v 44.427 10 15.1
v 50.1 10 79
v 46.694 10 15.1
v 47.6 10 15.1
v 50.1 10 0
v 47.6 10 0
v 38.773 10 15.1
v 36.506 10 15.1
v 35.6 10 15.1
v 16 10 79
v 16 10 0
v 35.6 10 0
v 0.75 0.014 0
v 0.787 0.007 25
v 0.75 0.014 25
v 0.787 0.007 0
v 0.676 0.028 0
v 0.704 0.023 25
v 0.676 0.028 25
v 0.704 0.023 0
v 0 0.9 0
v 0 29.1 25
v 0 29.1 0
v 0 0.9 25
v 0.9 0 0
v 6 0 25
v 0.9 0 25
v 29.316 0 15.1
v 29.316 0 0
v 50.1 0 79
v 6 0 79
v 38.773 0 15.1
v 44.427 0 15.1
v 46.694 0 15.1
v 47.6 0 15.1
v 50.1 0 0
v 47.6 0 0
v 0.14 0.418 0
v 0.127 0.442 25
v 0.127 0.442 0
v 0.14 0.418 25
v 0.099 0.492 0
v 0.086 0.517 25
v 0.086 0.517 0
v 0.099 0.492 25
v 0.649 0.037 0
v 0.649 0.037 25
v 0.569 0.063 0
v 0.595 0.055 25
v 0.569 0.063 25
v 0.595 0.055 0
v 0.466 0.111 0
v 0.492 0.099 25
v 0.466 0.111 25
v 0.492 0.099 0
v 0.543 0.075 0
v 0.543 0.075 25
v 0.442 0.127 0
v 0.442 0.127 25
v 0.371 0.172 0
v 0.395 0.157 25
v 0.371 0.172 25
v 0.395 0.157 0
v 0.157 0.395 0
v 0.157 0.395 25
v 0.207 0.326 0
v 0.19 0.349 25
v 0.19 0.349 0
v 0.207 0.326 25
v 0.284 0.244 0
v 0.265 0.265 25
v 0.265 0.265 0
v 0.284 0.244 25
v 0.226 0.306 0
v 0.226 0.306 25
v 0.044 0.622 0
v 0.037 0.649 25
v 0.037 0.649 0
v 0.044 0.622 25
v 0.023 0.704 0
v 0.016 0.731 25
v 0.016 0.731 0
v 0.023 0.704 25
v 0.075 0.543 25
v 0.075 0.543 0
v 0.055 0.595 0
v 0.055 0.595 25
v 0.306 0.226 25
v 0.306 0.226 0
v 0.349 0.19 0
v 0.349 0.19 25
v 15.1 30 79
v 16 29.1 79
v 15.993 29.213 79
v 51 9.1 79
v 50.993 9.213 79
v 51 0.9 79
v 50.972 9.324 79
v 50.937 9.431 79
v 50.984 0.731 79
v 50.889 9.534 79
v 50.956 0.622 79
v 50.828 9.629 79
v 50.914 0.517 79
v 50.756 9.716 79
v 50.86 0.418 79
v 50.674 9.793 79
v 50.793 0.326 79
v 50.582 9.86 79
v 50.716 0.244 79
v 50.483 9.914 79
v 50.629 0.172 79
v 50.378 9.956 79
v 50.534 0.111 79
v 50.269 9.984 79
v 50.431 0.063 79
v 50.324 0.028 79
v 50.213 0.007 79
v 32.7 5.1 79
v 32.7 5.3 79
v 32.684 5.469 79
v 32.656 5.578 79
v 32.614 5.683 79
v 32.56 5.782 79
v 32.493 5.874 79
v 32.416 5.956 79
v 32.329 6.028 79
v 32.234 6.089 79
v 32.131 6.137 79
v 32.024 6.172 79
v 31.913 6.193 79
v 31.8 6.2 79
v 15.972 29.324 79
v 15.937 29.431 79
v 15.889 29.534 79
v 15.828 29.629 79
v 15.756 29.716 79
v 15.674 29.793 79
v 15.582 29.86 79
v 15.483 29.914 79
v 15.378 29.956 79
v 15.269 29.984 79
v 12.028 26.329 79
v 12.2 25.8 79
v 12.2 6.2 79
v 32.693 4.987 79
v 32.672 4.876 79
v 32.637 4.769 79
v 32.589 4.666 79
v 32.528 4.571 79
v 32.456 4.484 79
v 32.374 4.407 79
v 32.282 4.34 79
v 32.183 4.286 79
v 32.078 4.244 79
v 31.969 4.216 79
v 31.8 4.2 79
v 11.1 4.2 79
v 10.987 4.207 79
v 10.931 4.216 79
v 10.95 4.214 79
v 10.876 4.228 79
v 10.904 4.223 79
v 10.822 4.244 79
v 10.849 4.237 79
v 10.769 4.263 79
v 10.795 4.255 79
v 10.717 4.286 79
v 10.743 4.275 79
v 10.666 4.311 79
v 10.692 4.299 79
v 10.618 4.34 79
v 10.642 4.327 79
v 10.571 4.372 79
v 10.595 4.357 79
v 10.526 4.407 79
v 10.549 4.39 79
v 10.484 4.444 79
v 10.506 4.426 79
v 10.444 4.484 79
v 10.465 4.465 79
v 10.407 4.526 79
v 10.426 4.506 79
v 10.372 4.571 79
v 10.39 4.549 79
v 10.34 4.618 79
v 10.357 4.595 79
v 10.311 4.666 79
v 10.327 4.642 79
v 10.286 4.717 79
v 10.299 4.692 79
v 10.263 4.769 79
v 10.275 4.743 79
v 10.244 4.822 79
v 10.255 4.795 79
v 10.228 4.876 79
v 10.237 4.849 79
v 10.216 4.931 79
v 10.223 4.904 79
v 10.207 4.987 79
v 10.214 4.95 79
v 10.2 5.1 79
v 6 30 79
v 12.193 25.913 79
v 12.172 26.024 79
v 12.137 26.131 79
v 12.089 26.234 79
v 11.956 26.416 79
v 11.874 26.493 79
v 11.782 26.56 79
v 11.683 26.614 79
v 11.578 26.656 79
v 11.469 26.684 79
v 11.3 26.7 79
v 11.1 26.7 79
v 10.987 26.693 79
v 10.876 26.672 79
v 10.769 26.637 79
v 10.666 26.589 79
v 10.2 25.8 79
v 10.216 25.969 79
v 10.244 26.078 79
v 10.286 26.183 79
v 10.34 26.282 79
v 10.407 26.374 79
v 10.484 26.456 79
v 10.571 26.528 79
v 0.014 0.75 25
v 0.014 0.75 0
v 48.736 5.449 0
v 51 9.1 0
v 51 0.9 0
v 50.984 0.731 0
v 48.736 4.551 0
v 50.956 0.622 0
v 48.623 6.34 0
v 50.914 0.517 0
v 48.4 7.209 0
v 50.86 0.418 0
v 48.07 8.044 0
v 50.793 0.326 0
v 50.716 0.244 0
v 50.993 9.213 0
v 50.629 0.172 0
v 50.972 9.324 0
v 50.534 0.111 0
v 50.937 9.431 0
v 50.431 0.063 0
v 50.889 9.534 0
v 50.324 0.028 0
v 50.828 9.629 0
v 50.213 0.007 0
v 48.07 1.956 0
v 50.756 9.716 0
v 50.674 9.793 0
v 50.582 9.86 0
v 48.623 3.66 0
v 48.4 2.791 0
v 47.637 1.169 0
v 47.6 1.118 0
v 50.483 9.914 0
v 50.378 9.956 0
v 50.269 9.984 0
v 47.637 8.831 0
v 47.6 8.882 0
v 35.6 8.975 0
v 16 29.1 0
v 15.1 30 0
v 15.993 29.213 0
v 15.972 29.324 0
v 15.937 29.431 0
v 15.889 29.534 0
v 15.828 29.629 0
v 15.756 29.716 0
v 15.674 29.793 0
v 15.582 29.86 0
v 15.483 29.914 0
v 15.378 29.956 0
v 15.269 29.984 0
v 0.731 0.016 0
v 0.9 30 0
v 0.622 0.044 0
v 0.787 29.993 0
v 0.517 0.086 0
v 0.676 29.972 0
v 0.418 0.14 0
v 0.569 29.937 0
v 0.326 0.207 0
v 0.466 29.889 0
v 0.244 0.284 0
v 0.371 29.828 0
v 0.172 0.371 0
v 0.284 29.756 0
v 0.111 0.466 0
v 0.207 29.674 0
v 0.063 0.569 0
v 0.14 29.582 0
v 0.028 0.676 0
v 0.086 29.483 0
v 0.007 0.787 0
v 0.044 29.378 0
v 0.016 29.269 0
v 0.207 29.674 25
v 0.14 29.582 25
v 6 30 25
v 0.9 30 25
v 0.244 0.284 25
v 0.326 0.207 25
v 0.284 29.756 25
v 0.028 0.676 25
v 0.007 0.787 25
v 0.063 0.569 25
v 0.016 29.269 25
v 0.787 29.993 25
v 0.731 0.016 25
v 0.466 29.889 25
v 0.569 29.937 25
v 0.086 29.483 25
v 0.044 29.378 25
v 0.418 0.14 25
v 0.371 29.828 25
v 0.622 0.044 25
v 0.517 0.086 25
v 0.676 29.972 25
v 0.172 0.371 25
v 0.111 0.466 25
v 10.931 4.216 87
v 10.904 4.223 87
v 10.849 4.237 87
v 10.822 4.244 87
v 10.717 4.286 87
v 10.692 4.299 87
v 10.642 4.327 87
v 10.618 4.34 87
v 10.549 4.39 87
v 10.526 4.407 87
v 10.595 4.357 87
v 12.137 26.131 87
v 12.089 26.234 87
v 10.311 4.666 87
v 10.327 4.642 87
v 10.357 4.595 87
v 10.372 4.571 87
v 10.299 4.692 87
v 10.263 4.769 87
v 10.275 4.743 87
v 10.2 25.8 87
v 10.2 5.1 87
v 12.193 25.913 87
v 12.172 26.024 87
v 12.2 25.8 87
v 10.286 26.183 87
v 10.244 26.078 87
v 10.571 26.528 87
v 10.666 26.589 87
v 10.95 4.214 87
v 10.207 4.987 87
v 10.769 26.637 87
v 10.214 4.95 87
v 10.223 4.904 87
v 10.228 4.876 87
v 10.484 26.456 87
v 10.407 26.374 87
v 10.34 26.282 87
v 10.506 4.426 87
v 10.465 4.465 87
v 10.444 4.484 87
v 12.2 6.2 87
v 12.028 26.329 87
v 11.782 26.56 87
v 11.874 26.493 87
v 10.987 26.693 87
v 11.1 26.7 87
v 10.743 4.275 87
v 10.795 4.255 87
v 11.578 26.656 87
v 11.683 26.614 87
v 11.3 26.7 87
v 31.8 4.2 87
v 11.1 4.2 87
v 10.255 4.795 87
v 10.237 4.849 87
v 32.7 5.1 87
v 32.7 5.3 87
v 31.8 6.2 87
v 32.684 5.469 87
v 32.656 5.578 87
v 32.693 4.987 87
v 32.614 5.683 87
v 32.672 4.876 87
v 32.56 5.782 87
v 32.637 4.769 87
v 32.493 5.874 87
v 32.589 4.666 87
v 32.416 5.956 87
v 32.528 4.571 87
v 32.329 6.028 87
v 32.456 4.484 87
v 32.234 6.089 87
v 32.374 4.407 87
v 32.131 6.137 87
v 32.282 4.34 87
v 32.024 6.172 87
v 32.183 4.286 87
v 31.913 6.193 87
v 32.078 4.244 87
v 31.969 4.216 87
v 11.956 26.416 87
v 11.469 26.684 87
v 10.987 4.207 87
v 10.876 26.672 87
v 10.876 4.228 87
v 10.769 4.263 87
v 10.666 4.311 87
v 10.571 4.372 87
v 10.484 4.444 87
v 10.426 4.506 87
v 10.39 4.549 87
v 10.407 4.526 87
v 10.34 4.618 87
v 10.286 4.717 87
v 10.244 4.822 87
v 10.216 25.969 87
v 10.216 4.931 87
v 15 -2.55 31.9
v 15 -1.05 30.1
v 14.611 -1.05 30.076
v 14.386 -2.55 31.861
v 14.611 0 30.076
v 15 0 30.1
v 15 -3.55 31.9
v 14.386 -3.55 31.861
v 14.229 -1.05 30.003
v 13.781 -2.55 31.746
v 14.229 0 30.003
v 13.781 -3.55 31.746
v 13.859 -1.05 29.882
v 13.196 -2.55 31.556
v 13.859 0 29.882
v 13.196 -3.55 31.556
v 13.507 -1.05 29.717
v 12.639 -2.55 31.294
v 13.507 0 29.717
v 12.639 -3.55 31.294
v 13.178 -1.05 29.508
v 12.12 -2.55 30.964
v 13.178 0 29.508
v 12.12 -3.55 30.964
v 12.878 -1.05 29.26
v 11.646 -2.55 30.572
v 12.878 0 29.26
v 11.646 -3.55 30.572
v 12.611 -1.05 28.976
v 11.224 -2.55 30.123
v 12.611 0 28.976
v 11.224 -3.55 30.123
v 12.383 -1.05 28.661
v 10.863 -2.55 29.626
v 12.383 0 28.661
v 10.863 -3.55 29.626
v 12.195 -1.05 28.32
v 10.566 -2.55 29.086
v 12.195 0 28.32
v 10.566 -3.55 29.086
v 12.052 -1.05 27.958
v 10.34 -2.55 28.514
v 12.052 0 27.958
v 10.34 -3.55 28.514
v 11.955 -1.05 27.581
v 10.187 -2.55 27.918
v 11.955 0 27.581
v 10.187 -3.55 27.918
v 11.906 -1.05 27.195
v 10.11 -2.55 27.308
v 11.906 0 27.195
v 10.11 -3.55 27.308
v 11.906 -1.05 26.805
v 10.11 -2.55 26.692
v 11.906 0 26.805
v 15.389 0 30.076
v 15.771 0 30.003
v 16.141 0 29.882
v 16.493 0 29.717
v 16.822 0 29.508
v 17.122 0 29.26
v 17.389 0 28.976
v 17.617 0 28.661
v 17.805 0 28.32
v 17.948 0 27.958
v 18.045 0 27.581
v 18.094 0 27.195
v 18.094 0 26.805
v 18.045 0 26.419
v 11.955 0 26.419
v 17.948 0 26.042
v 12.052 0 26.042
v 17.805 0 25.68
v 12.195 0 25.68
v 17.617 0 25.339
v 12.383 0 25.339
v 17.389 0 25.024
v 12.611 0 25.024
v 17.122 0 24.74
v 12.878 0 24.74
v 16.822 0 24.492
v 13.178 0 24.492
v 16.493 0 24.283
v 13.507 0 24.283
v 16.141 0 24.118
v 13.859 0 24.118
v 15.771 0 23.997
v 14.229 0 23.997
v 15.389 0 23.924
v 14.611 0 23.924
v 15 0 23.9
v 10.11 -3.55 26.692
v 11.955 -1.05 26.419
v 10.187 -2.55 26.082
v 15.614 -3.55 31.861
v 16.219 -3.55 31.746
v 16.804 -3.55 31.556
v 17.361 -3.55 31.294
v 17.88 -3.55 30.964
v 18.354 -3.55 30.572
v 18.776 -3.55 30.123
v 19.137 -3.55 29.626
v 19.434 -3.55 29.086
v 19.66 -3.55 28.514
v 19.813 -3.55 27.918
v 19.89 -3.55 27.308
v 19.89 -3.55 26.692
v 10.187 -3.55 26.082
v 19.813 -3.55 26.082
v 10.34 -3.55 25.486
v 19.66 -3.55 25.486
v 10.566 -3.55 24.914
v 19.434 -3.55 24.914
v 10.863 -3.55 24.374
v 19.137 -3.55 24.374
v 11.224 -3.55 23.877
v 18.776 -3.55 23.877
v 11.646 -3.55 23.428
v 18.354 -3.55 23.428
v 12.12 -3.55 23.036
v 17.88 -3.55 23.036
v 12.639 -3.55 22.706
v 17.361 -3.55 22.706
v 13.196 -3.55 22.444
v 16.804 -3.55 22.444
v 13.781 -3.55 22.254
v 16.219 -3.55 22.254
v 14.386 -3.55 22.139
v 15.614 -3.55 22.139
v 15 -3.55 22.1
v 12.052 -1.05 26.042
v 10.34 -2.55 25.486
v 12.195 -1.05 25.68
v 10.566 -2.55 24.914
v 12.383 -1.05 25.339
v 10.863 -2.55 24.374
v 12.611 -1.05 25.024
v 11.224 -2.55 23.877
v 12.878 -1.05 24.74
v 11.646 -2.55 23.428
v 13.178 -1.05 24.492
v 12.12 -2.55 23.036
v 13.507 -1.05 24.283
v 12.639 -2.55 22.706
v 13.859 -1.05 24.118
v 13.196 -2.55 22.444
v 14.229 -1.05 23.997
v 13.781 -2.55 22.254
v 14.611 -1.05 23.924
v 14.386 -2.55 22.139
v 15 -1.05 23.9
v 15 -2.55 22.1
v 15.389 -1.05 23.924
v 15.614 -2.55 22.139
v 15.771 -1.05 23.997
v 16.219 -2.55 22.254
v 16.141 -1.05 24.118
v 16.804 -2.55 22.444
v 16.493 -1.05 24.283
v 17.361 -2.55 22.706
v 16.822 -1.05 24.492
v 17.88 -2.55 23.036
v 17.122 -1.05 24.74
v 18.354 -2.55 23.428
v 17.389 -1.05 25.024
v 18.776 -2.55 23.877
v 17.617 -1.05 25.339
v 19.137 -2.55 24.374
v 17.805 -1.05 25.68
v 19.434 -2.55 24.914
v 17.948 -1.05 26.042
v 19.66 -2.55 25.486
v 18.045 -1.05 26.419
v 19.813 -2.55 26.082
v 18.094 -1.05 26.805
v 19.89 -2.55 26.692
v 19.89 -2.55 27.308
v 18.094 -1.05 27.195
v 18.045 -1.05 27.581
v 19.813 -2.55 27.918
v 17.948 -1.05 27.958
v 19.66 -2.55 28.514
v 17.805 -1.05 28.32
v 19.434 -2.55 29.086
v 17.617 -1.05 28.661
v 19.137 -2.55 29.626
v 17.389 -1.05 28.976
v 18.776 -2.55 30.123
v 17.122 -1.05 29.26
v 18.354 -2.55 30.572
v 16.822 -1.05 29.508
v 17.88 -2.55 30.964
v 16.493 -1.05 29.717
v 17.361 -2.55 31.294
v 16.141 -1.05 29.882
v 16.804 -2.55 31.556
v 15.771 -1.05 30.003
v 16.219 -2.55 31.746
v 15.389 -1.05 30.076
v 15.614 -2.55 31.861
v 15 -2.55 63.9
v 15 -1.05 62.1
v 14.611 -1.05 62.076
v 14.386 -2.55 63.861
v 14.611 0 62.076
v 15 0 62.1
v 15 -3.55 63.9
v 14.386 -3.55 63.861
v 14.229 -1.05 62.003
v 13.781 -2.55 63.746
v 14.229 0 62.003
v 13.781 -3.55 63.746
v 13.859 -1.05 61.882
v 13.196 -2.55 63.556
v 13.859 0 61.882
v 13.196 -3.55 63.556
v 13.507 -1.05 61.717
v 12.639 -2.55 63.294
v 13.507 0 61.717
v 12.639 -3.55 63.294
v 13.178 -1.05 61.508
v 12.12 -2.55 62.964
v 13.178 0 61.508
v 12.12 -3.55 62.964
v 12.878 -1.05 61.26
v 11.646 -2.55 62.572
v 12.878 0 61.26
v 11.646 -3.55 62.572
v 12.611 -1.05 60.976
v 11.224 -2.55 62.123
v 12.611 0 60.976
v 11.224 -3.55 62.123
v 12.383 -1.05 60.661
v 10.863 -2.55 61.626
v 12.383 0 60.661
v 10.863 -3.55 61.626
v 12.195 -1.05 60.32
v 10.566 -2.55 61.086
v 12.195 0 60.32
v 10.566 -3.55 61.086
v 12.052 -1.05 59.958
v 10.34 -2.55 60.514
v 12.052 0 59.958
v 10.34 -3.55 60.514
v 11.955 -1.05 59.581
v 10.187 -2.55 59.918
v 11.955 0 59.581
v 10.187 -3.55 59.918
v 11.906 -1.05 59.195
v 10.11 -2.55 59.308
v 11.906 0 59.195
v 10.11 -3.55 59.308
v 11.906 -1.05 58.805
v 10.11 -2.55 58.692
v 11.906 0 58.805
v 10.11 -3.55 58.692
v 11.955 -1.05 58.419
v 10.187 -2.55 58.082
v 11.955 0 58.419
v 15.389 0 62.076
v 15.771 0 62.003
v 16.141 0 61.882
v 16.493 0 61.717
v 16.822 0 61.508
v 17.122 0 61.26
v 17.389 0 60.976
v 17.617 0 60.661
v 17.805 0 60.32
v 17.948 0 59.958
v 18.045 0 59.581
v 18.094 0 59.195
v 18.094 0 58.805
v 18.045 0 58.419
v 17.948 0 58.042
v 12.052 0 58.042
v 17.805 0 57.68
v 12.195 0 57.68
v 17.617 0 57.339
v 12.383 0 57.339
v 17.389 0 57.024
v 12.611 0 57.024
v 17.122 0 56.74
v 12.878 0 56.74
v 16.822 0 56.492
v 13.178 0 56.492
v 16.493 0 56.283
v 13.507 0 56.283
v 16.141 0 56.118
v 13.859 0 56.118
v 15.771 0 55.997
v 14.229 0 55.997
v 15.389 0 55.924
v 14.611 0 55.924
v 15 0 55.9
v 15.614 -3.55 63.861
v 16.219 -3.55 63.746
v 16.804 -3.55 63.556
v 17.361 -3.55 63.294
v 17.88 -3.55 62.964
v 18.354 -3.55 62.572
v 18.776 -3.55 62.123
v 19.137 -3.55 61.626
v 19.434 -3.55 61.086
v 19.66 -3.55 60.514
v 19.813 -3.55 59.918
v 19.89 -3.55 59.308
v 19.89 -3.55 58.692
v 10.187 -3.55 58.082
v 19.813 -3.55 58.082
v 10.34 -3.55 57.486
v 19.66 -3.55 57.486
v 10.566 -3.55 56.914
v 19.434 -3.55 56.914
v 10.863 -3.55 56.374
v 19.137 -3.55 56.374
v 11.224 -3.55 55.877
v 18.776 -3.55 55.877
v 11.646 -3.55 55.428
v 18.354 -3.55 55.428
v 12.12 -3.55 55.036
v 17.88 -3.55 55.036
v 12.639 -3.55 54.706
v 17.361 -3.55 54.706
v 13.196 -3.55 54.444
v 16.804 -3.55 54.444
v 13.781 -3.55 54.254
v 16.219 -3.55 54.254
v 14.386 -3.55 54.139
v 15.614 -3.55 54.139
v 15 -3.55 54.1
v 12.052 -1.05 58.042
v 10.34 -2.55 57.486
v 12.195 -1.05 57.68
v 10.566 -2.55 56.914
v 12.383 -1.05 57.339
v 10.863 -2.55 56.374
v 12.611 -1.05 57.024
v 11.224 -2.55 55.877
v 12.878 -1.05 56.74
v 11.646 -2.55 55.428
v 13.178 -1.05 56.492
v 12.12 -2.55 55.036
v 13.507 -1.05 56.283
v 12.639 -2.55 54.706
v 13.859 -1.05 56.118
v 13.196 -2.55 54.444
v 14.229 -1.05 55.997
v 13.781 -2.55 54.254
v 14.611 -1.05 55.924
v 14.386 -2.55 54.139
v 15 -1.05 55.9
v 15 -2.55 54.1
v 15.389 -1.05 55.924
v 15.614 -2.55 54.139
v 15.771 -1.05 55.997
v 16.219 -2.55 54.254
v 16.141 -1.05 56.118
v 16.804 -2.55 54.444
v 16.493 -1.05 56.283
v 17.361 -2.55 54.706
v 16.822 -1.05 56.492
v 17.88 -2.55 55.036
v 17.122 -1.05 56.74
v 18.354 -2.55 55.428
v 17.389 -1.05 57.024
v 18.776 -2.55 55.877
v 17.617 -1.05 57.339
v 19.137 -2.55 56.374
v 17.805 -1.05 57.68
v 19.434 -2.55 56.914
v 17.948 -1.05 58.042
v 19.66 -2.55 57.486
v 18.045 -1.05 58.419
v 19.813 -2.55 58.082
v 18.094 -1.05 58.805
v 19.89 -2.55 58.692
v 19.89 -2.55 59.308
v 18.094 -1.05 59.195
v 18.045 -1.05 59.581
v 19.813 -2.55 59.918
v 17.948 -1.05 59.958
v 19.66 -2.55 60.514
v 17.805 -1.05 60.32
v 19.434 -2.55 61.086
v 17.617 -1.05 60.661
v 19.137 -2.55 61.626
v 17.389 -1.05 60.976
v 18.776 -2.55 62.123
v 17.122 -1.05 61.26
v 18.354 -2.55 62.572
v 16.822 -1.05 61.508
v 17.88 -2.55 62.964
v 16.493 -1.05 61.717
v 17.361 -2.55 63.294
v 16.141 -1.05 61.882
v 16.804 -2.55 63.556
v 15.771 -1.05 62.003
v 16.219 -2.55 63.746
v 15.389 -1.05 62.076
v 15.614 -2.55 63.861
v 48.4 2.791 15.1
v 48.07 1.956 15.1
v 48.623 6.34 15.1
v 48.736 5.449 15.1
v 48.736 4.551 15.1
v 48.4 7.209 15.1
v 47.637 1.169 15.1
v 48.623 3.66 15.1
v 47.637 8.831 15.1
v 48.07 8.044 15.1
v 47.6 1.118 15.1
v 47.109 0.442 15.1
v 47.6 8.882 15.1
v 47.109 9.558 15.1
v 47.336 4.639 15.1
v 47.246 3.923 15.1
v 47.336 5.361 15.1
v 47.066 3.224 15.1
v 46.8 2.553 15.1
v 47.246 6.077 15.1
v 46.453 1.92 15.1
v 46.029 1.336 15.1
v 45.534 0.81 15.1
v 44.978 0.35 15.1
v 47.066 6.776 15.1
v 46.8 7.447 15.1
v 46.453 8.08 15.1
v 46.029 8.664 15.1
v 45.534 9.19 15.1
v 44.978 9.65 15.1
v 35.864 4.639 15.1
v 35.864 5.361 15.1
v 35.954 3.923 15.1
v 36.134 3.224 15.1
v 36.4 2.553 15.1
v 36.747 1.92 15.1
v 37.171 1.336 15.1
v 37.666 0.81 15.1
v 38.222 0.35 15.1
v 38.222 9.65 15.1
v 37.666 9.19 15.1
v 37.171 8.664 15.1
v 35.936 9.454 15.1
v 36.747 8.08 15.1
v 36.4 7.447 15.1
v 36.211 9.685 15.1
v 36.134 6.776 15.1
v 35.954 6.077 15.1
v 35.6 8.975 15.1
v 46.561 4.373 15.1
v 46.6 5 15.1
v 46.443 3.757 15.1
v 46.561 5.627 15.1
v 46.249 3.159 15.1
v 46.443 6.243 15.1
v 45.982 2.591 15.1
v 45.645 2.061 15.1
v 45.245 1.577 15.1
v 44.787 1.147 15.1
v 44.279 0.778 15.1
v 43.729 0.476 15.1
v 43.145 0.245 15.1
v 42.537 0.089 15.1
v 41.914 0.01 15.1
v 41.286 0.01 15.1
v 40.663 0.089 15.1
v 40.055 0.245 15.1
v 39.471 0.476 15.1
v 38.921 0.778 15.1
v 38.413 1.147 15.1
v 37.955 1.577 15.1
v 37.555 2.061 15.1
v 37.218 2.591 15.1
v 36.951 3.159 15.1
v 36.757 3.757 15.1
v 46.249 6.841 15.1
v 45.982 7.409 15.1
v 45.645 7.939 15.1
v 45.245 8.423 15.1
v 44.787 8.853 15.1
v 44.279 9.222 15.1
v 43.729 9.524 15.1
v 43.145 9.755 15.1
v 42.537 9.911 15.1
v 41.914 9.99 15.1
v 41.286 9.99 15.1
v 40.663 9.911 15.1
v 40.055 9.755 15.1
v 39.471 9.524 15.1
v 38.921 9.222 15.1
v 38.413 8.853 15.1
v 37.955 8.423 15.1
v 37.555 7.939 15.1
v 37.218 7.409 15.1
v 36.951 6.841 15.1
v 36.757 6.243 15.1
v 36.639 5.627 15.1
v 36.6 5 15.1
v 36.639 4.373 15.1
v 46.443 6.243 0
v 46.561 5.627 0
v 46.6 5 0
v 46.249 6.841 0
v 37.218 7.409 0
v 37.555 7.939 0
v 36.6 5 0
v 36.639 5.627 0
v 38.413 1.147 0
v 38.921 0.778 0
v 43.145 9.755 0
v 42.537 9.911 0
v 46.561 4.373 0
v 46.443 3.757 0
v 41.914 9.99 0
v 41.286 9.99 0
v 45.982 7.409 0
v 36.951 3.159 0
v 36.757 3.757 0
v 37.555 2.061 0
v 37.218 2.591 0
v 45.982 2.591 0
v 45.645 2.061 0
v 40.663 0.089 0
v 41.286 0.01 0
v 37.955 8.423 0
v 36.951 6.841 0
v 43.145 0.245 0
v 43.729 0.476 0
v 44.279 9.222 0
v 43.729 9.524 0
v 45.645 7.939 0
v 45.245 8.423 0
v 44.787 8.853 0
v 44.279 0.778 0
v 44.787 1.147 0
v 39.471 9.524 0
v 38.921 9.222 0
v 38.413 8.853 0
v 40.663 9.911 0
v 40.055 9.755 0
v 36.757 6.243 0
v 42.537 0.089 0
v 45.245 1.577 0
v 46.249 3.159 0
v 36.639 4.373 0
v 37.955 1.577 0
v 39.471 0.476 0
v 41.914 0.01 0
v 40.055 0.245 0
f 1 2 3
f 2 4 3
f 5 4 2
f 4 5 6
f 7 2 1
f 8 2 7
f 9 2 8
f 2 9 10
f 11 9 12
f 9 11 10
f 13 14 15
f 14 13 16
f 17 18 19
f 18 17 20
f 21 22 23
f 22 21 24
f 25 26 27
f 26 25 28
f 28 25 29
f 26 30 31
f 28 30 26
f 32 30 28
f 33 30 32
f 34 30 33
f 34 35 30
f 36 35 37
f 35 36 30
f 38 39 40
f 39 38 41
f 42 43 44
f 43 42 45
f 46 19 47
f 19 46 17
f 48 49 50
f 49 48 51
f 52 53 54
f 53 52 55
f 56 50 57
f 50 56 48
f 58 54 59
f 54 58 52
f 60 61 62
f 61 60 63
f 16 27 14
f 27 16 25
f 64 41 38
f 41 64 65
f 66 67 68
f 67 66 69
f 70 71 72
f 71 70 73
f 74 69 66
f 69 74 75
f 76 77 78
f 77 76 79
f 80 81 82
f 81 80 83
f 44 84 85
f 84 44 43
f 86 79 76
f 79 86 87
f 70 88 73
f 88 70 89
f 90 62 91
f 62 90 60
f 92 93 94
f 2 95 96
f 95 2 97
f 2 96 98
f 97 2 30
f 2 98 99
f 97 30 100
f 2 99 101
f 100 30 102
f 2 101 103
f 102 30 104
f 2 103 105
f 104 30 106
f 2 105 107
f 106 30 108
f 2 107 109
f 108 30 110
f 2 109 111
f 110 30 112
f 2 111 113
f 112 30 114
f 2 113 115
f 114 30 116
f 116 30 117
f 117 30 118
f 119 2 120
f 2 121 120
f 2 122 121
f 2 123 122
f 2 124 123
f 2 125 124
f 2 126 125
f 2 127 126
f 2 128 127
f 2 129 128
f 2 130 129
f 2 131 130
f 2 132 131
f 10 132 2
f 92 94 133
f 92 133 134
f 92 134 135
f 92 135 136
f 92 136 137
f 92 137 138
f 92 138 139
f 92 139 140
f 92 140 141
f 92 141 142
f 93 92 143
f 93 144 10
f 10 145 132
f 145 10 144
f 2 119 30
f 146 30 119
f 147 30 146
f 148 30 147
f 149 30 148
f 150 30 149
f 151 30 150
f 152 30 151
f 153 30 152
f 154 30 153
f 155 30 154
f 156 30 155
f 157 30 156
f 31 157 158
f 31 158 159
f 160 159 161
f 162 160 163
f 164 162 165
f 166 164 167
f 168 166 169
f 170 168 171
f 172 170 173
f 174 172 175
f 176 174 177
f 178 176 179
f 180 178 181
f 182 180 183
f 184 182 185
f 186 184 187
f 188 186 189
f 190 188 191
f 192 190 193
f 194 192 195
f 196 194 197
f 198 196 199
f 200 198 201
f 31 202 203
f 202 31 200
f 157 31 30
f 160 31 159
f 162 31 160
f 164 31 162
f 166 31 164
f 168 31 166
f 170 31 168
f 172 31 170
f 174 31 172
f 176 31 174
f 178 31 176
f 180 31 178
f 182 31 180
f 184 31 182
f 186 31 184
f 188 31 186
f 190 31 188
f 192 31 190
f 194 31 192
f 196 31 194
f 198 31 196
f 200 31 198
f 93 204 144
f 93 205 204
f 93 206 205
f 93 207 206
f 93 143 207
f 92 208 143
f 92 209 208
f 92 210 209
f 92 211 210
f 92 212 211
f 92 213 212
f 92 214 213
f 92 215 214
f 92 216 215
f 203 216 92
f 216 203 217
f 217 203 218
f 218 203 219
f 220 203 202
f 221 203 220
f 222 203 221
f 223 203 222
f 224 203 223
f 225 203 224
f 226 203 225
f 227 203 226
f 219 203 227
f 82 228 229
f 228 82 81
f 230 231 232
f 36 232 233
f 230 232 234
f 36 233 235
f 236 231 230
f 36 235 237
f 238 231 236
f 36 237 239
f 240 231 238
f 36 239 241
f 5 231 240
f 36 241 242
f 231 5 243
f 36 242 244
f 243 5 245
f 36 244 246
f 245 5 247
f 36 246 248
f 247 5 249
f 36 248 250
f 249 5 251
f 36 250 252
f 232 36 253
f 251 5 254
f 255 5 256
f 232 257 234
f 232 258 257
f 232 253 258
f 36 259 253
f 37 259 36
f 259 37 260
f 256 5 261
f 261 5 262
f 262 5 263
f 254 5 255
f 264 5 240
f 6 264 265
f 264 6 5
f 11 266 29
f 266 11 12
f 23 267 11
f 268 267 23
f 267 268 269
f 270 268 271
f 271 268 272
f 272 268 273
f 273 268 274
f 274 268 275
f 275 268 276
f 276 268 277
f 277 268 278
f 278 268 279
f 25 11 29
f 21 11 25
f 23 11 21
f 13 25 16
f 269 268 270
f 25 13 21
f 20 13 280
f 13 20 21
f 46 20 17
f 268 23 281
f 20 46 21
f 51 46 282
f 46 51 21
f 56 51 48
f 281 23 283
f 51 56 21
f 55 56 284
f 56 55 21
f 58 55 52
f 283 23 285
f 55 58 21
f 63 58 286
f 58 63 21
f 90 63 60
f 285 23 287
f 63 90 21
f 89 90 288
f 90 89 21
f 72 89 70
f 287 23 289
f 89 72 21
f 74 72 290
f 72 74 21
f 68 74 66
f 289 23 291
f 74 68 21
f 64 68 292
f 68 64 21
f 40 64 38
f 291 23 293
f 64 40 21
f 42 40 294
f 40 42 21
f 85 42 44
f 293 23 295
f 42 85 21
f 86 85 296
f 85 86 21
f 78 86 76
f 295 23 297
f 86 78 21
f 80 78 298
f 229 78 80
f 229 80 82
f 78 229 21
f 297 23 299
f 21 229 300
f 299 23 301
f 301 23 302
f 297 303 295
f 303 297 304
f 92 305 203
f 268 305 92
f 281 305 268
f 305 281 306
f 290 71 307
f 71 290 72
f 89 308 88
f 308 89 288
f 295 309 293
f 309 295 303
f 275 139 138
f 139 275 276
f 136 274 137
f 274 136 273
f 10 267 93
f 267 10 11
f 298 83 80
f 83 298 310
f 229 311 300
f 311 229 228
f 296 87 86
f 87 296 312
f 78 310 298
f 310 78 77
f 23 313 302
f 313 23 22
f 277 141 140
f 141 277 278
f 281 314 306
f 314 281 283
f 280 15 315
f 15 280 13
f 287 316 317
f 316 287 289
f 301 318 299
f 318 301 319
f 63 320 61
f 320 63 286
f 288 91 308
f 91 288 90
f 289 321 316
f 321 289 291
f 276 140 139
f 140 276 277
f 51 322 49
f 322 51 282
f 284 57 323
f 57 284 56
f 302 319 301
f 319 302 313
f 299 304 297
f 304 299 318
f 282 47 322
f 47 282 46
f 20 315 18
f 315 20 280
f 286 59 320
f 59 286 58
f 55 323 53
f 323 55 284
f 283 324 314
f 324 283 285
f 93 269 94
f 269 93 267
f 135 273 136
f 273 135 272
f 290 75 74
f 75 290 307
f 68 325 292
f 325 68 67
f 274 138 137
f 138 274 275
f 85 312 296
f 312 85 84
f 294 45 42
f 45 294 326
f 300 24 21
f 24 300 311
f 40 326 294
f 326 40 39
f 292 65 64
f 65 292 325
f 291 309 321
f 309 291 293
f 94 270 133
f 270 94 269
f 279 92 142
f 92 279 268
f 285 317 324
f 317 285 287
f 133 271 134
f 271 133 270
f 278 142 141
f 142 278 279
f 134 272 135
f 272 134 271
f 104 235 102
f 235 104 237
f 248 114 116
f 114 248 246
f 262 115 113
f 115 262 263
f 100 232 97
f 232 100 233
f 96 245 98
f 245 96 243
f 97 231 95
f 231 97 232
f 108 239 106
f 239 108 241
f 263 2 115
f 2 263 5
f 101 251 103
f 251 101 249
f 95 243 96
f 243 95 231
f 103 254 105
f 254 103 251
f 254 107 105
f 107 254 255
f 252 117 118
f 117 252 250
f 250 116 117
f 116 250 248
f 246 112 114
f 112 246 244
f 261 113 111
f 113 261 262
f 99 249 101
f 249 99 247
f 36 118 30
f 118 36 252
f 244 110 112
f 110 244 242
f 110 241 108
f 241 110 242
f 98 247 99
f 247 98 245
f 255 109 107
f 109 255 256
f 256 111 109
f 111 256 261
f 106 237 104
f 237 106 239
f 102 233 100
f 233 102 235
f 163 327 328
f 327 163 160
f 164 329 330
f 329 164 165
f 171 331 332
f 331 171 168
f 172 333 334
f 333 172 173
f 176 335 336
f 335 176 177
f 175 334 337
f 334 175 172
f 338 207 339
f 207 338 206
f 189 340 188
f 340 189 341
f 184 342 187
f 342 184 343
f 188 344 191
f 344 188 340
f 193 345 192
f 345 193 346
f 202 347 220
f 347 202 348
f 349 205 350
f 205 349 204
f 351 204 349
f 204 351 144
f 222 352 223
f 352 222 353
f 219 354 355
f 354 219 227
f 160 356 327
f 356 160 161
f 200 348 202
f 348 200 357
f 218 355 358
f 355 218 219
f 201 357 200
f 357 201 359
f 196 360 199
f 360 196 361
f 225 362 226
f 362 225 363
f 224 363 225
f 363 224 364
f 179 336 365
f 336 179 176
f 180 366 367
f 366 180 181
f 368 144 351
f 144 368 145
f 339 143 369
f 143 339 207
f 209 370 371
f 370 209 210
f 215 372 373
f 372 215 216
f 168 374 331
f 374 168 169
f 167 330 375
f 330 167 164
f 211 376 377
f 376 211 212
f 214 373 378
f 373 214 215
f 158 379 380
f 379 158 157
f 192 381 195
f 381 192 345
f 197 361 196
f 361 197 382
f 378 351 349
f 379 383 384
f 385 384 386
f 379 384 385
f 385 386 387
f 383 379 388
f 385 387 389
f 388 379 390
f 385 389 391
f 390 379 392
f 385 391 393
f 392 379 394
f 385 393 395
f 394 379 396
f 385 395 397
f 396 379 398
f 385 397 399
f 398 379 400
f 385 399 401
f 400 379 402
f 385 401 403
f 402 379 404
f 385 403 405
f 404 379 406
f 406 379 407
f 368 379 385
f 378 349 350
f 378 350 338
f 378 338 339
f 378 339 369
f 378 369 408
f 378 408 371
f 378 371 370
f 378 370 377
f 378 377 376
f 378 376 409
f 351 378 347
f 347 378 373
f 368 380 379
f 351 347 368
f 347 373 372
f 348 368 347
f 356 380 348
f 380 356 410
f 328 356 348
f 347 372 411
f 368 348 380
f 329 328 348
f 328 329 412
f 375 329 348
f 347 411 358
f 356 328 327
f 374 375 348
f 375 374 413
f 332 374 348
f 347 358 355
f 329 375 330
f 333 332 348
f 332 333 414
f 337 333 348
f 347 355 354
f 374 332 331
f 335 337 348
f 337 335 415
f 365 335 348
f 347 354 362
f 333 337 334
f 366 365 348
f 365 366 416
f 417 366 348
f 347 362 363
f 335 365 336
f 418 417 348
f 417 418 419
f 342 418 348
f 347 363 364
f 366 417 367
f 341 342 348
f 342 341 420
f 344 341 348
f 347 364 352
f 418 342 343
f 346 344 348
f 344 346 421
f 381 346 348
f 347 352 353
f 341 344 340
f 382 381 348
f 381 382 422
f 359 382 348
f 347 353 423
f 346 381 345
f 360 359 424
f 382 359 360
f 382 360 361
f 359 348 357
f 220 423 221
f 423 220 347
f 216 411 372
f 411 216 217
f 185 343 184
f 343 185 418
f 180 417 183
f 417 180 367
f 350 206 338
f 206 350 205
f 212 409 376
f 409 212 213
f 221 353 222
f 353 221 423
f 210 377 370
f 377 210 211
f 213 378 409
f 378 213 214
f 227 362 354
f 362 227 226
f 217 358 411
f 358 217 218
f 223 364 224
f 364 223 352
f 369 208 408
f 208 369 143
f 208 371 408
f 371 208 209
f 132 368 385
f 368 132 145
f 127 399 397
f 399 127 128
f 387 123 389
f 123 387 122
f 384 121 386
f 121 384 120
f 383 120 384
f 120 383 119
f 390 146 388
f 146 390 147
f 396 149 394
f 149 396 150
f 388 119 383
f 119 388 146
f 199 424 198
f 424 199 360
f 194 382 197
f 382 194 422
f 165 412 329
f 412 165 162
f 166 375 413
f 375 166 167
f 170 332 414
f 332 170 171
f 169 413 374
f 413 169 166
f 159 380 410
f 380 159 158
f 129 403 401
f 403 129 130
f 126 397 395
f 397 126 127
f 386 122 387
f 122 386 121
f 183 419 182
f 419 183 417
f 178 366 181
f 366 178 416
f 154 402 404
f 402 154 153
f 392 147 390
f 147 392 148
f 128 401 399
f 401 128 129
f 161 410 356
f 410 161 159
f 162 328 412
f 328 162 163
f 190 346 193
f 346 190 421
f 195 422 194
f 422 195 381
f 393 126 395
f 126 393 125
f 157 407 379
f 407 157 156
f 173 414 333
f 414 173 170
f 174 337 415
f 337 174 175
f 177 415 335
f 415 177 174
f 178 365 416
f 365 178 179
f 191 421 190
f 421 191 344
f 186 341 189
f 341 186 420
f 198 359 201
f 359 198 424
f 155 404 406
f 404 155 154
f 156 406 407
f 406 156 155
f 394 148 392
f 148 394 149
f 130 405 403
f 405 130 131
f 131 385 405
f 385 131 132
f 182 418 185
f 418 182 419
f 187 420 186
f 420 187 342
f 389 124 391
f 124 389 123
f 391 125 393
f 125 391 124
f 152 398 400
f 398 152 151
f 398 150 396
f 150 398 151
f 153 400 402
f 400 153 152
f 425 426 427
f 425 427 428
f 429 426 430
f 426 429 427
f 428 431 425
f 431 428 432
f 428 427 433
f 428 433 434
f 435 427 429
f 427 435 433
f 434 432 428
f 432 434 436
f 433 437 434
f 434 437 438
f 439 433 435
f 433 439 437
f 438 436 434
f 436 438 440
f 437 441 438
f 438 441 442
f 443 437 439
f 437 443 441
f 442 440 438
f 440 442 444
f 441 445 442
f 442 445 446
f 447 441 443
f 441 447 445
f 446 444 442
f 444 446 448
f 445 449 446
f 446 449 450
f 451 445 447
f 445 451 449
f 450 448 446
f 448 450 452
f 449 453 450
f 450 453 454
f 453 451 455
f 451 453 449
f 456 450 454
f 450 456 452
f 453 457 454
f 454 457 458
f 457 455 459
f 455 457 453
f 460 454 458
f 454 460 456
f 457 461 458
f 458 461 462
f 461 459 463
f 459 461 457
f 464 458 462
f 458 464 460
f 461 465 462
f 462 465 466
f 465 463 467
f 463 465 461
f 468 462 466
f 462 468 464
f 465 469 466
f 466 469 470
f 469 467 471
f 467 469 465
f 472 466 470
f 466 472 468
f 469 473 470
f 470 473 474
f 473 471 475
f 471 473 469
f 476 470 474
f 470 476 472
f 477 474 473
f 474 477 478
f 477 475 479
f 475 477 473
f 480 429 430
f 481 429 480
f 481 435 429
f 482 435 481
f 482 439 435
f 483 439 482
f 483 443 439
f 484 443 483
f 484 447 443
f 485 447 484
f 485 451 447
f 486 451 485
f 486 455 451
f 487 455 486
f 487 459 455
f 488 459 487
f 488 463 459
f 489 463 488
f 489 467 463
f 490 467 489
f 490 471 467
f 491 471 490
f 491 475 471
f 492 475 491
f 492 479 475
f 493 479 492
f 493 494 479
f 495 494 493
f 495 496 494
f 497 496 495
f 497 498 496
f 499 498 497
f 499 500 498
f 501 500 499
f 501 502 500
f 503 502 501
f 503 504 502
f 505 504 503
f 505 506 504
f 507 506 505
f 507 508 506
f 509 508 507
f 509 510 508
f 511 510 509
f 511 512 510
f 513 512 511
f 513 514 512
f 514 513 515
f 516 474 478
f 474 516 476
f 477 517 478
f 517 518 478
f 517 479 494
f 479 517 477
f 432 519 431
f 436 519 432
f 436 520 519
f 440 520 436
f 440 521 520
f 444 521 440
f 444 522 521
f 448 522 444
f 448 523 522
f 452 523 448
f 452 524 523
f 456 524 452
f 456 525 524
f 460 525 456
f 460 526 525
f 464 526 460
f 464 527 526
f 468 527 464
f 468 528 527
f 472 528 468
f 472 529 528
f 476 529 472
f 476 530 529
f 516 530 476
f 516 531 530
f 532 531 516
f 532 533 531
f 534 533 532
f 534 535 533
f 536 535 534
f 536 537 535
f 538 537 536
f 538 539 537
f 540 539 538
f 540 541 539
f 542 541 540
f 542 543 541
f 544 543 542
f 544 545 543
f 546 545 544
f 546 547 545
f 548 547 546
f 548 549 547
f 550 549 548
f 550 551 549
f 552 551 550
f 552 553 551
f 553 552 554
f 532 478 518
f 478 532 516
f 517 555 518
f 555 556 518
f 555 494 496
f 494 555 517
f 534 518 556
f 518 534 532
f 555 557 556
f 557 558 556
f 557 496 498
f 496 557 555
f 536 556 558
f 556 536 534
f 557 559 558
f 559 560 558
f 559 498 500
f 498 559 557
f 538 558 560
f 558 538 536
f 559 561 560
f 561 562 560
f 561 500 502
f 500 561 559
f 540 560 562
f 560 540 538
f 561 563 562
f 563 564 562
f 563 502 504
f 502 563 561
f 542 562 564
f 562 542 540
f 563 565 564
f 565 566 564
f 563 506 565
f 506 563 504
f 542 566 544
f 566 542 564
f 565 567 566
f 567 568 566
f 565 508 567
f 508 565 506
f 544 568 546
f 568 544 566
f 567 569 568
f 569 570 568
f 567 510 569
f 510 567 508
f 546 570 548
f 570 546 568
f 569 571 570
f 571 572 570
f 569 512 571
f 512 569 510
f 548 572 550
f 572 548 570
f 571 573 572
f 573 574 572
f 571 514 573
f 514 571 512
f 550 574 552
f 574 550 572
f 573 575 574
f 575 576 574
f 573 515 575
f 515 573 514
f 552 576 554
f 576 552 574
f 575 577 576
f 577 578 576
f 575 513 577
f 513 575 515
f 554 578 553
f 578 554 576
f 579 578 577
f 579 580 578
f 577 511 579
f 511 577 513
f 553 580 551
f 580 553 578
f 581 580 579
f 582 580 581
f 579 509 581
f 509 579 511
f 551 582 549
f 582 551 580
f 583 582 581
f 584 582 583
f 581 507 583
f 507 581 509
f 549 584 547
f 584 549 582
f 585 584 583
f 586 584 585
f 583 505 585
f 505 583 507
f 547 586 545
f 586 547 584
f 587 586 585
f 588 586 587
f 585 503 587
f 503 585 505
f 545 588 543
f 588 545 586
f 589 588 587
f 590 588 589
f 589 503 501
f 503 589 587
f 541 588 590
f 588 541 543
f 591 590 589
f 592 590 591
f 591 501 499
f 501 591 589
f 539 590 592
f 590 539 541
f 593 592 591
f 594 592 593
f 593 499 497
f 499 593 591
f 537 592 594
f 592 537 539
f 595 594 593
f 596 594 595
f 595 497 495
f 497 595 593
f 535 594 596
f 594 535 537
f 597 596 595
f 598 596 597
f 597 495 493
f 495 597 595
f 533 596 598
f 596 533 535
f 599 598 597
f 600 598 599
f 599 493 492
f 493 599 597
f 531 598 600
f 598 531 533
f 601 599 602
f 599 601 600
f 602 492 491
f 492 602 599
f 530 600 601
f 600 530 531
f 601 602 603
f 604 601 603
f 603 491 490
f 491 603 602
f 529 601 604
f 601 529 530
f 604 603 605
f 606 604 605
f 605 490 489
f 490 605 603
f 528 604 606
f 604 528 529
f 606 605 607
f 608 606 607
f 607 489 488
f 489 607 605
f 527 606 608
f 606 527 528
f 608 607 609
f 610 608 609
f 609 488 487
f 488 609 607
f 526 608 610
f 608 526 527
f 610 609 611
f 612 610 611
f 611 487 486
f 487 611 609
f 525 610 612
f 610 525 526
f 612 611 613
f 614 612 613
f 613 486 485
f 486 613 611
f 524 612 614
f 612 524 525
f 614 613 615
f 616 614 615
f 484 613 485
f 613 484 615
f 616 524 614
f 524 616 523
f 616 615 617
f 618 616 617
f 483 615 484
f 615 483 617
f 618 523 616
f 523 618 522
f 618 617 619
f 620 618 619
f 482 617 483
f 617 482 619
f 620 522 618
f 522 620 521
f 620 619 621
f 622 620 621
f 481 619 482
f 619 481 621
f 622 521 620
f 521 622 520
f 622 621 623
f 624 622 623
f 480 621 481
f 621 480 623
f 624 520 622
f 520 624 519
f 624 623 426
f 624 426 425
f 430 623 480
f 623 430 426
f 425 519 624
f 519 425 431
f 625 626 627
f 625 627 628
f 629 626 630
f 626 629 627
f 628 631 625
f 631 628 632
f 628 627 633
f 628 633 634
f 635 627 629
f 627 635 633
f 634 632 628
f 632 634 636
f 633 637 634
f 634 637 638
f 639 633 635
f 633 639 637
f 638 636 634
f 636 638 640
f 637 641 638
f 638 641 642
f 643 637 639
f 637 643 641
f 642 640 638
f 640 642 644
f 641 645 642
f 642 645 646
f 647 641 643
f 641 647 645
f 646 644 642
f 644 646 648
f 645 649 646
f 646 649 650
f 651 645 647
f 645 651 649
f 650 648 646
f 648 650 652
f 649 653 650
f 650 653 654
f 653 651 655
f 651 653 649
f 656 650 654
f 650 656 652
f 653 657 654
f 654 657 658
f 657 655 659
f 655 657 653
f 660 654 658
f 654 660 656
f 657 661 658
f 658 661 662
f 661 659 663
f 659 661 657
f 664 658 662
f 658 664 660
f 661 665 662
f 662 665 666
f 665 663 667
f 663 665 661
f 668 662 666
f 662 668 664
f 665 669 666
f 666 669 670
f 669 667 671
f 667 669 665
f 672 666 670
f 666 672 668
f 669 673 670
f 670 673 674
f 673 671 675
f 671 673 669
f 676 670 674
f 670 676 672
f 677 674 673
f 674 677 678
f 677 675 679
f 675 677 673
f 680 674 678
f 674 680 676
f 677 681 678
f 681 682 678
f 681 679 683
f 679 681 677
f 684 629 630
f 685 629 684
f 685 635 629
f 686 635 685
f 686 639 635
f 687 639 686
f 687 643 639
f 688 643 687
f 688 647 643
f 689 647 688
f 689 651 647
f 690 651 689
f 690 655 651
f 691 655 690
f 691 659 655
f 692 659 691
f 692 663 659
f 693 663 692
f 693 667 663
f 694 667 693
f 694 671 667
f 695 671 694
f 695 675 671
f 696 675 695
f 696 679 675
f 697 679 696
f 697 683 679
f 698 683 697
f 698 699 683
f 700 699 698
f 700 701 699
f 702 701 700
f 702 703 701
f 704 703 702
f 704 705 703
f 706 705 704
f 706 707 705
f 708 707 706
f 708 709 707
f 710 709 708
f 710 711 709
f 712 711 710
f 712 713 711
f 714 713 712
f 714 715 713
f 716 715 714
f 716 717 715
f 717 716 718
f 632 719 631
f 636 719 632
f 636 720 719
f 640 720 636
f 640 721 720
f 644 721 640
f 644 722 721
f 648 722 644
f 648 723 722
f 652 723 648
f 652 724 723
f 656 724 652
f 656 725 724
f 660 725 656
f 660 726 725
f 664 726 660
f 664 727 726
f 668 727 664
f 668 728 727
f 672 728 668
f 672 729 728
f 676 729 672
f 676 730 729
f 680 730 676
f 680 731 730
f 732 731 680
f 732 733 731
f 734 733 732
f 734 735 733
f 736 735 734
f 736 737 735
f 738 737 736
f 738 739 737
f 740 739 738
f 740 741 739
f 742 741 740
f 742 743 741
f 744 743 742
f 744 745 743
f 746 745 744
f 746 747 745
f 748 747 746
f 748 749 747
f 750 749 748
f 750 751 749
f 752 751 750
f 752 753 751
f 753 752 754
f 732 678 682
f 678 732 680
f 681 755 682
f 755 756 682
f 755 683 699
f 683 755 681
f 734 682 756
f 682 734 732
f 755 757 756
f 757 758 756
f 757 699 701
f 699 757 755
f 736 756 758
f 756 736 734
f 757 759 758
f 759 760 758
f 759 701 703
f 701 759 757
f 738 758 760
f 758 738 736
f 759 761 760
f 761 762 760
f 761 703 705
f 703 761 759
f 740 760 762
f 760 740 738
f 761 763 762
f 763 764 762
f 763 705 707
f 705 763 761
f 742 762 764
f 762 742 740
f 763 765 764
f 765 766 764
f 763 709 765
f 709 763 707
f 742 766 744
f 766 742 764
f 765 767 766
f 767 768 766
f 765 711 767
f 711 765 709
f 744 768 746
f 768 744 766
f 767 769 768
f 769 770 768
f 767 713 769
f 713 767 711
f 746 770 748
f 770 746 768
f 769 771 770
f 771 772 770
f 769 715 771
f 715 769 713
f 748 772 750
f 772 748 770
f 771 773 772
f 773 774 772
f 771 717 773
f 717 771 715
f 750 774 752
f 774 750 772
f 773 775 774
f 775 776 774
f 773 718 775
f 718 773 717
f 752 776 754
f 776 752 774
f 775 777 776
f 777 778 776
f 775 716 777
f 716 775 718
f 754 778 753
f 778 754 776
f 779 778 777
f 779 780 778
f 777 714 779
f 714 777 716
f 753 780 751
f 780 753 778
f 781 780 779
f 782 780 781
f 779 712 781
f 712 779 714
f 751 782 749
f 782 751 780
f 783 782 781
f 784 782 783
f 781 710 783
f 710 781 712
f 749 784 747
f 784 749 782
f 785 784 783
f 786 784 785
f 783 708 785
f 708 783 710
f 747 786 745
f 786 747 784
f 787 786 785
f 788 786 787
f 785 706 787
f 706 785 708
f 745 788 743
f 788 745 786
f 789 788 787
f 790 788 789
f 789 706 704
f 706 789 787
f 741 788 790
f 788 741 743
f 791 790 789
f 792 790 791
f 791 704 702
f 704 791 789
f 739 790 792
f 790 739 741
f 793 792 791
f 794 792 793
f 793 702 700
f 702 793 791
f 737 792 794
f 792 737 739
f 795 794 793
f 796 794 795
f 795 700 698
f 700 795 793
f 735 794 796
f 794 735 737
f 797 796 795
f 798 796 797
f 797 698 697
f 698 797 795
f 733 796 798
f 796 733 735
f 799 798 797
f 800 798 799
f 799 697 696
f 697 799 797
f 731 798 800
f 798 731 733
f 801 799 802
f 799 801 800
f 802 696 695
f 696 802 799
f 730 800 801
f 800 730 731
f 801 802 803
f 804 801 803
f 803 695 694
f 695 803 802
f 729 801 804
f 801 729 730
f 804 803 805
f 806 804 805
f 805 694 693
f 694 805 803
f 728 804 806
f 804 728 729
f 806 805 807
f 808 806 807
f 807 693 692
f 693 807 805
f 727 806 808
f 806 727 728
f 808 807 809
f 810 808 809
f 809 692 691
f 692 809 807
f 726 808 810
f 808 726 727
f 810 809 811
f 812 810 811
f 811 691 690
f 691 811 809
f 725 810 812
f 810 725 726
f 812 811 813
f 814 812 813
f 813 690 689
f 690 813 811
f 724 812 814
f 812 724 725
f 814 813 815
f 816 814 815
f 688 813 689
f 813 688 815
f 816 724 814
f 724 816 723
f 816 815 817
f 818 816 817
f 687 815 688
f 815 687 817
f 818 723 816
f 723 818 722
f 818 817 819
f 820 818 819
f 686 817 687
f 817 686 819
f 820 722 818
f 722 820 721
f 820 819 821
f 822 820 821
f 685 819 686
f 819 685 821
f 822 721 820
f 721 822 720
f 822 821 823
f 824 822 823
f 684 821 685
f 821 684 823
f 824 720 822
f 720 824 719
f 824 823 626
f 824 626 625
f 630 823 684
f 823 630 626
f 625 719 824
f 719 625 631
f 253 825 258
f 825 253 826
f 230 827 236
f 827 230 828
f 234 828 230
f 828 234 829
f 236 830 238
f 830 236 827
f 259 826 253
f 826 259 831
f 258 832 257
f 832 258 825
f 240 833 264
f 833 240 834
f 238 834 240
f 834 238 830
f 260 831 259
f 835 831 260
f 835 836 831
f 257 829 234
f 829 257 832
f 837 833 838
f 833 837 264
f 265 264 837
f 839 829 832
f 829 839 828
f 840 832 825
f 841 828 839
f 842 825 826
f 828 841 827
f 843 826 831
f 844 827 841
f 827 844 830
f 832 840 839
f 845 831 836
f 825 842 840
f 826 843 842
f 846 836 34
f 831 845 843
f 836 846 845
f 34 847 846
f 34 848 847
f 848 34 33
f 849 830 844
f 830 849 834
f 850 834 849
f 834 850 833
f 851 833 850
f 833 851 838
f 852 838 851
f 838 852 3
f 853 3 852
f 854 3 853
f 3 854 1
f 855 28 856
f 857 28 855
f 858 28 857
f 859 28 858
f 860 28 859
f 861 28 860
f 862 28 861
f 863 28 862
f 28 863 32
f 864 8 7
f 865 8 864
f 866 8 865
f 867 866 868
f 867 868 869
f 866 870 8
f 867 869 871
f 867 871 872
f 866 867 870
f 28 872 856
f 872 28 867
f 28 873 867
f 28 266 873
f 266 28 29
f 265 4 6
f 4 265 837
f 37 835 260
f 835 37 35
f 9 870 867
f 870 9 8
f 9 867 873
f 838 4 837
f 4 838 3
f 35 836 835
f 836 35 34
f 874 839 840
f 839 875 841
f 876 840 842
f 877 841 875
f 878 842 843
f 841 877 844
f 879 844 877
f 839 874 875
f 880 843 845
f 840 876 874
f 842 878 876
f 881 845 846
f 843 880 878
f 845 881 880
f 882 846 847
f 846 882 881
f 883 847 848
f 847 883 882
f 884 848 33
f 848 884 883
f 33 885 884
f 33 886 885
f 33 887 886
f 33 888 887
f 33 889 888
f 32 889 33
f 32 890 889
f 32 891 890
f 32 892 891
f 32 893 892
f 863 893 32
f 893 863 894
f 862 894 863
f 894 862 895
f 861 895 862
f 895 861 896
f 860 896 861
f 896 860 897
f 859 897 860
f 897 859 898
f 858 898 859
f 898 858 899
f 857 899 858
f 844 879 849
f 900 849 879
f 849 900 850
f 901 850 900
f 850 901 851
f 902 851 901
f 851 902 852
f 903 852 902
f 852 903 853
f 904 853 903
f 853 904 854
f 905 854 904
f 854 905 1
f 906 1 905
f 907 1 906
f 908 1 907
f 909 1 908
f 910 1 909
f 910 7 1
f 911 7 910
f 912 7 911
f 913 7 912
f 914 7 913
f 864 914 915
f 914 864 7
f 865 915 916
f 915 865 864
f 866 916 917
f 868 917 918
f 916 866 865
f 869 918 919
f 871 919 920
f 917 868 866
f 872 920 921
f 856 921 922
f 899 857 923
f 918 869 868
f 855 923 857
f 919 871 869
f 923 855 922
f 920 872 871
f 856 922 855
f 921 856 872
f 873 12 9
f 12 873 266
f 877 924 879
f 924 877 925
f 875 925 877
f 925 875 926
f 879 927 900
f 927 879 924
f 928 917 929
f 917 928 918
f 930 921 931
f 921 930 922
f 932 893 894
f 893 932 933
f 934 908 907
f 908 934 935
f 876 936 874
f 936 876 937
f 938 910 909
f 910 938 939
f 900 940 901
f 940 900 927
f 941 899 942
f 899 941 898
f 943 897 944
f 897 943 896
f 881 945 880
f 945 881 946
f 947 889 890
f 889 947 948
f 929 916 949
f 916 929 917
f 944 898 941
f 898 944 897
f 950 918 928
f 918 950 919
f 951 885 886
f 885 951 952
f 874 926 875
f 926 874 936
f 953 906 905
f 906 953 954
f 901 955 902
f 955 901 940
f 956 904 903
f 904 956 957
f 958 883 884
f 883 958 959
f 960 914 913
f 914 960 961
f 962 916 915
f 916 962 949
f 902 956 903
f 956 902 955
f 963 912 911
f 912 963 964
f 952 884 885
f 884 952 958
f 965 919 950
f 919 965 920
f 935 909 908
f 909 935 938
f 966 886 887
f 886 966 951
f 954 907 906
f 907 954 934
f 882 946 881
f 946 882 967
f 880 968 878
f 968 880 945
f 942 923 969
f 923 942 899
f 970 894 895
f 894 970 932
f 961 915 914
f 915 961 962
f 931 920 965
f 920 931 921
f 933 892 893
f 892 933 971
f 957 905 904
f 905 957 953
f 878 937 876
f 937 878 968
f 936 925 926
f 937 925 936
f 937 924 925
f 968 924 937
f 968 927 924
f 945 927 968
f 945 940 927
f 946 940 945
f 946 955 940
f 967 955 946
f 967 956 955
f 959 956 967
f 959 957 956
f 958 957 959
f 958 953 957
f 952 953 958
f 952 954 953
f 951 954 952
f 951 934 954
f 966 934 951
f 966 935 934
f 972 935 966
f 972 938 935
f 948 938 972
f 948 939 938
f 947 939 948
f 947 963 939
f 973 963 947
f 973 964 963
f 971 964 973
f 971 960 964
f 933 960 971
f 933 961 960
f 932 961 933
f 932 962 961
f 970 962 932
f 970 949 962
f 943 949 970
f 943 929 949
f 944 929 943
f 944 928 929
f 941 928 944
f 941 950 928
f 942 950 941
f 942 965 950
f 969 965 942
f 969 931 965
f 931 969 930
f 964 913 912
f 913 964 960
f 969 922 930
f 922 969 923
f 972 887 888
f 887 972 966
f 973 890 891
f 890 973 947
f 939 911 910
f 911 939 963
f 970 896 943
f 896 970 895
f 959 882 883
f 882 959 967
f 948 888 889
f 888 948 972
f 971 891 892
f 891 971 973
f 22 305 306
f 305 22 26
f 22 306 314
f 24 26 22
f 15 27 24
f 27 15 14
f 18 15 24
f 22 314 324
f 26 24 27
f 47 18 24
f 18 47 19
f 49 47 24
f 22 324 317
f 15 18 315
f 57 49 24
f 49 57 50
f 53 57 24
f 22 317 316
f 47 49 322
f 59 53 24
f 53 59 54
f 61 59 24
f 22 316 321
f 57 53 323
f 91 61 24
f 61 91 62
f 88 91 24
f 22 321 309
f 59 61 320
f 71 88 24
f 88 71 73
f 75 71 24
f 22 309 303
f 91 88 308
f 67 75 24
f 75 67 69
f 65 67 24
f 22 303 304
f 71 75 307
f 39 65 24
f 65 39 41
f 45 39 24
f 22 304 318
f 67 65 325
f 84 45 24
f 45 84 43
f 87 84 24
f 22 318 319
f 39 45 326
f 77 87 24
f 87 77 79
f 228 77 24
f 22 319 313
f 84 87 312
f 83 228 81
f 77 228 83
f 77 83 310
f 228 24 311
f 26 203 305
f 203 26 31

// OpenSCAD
// file: construction.scad
/*
Specialized construction functions specifically for the enclosure.
By combining these operators the various instances of enclosure pieces 
can be constructed.
*/
include <parameters.scad>;
use <utility.scad>;

module interlock() {
    ra = knob_diameter/2;
    rb = lug_diameter/2;
    
    color("DarkSeaGreen")
        rotate([0,90,90]) 
            rotate_extrude()
                polygon([[0,0],[0,lug_height],[rb,lug_height],
                    [rb,2.5],[ra,1],[ra,0]]);
}

// extend the corner frame to be symmetrical with the front corner
module extend_frame_x(height=frame_corner_height) {
    union() {
        children(0);
        translate([hinge_inner_diameter*2, hinge_inner_diameter,0]) 
            rotate([0,0,-90])
                frame( hinge_inner_diameter*3+1, 
                    height, hinge_inner_diameter, 
                    corner_roundness );
    }
}

module frame( width, height, thickness, roundness ) {
    color("SteelBlue") 
        linear_extrude(height=height)
            apply_roundness(roundness, $fs =0.01) 
                    square( [thickness, width] );
}

module frame_corner( width, height, thickness, roundness ) {    
    union() {
        mirror([0,1,0]) 
            rotate([0,0,-90])
                frame( width, height, thickness, roundness );
        frame( width, height, thickness + panel_thickness, roundness );
    }   
}

module frame_connector_corner(clearance=0) {
    translate([panel_thickness*1.7,panel_thickness*0.70, 0]) 
        color("SteelBlue") cornerize()
            frame( frame_corner_width*0.75, frame_connector_depth, 
                frame_thickness*.20+clearance, corner_roundness );
        
}

module add_lugs() {   
    union() {
        children(0);

        translate([interlock_offset_x,-lug_height,interlock_offset_z]) 
            interlock();

        translate([interlock_offset_x,-lug_height,
                interlock_offset_z+interlock_gap])
            interlock(); 
    } 
}

module add_connector(height=frame_corner_height) {
    union() {
        children(0);
        translate([0,0,height])
            frame_connector_corner();
    }
}

module add_hinge_post( top=false ) {
    union() {
        difference() {
            children(0);
            // create a negative space that snuggly fits the hinge
            translate([frame_corner_width+plastic_thickness+hinge_gap,
                hinge_inner_diameter/2, (top?frame_corner_height:0)])
                mirror(top?[0,0,1]:[0,0,0])
                    union() {
                        height = hinge_height-hinge_inner_diameter;
                        translate([0,0,height/2]) 
                            cube([hinge_inner_diameter+2,
                                hinge_inner_diameter+2,height+0.2],true);
                        
                        rotate([0,0,-90]) 
                            translate([0,0,-1.4]) 
                                scale([1.1,1.1,1.1]) hinge();
                    }
            
        }
        color("SteelBlue")
            translate([frame_corner_width+plastic_thickness+hinge_gap,hinge_inner_diameter/2,0])
                cylinder(d=hinge_inner_diameter, frame_corner_height);
    }
}

module add_outside_frame( height ) {
    color("SteelBlue")
    union() {
        children(0);
        translate([-plastic_thickness,-plastic_thickness,0])
            frame( frame_corner_width+plastic_thickness, height, frame_thickness,
                corner_roundness);
        translate([14.5,0.05,height/2])
            rotate([0,0,8])
            cube([frame_corner_width/2,plastic_thickness,height],true);
    }
}

module hinge() {
    height = hinge_height-hinge_inner_diameter;
    width = hinge_inner_diameter+hinge_ring_thickness;
    difference() {
        
        // create the base shape for the hinge
        color("Salmon") union() {
            
            cylinder(d=width, height);
            
            translate([hinge_inner_diameter*3+hinge_clearance,
                -hinge_offset,height/2-plastic_thickness/2]) 
                cube([hinge_length,hinge_thickness,
                    height+plastic_thickness],true);
           
            translate([2.52,-5.2,height/2]) 
                rotate([0,0,40]) 
                    cube([hinge_inner_diameter,
                        width+1,height],true);
        }
        
        // remove a hole for the hinge post to slide into
        cylinder(d=hinge_inner_diameter+tolerance_smooth, height+1);
        
        // trim the left corner
        translate([4,-17.5,height/2-1]) 
            rotate([0,0,145]) 
                cube([50,width-2,height+3],true);
        
        // smooth the tranistion to the bottom edge
        translate([19,-10,height/2-17.85]) 
            rotate([-88.5,0.1,96]) 
                cube([40,20,100],true);
        
        // add a chamfer to right corner
        translate([hinge_length+8,0,height+25]) 
            rotate([0,45,0]) 
            cube(50,true);
    }   
}

module add_connector_slot() {
    difference() {
        children(0);
        frame_connector_corner(tolerance_tight);
    }
}

module frame_vertical() {
    add_connector_slot()
    add_connector(frame_vertical_height)
    extend_frame_x(frame_vertical_height)
        frame_corner( frame_corner_width, 
            frame_vertical_height, frame_thickness, 
            corner_roundness );          
}
// file: support.scad
/*
Provides support objects that are used to model the environment of the enclosure
to ensure the pieces slot together and fit properly.
*/
include <parameters.scad>;
use <utility.scad>;

module wall_panel() {
    cube([panel_height,panel_width,panel_thickness]);
}

module door_panel() {
     cube([door_panel_width,door_panel_height,door_panel_thickness]);
}

module left_wall_panel() {
    translate([panel_thickness,0,panel_offset_z]) 
        rotate([0,-90,0]) 
            wall_panel();
}

module back_wall_panel() {
    translate([(enclosure_width-panel_width)/2,
            enclosure_depth-panel_thickness-plastic_thickness,
            panel_offset_z]) 
        rotate([-90,-90,0]) 
            wall_panel();
}

module right_wall_panel() {
    translate([enclosure_width,0,panel_offset_z]) 
        rotate([0,-90,0]) 
            wall_panel();
}

module left_door(open=false) {
    translate([frame_corner_width+plastic_thickness+hinge_gap,
            hinge_inner_diameter/2,0]) 
        rotate([90,0,open?-90:0]) 
            translate([door_hinge_offset,0,hinge_offset-
                    door_panel_thickness/2])
                door_panel();
}

module right_door(open=false) {
    translate([enclosure_width,0,0])  
        mirror([1,0,0]) left_door(open);
}
// file: utility.scad
/*
Generically useful utility functions.
*/

// applies roundness without altering dimensions of object
module apply_roundness(r)
    offset(r) offset(delta=-r) children(0);

// makes a corner piece by mirroring and rotating one side
module cornerize() {
    union() {
        children(0);
        mirror([0,1,0]) 
            rotate([0,0,-90])
                children(0);
    }
} 

/*
 The fix_preview series of functions are used to make small
 translations in order to reduce conincident plane artifacts
 from the preview mode. 

 It would be nice to have just one module for this but I haven't
 figured out a way of doing this generically - so the following
 uses a small translation in different directions depending on
 the use case needed.
*/
module fix_preview() {
    translate($preview?[-0.001,-0.001,-0.001]:[0,0,0])
        children(0);
}

module fix_preview2() {
    translate($preview?[-0.001,0.001,-0.001]:[0,0,0])
        children(0);
}

module fix_preview3() {
    translate($preview?[-0.001,0.001,0.001]:[0,0,0])
        children(0);
}
// file: parameters.scad
$fn=50;

// Wall thickness and tolerance
plastic_thickness=2.0;
tolerance_smooth=0.45;
tolerance_tight=0.35;

// Specify enclosure dimensions
enclosure_height=475.0;
enclosure_depth=535.0;

// Wall panel dimensions
panel_thickness=6.0;
panel_height=450.0;
panel_width=535.0;
panel_offset_z = enclosure_height - panel_height;

// Door panel dimensions
door_panel_thickness=3.0;
door_panel_width=250.0;
door_panel_height=475.0;
door_hinge_offset=6.5;

// Frame
frame_corner_width=30.0;
frame_corner_height=79.0;
frame_thickness = plastic_thickness*2 + panel_thickness;
frame_side = (enclosure_height - frame_corner_height*2)/2;
frame_clip_height=50.5;
corner_roundness=0.9;
frame_vertical_height = (enclosure_height-frame_corner_height*2)/2;
frame_connector_depth = 8.0;

// Interlock
knob_diameter=9.8;
lug_diameter=6.2;
lug_gap=1.4;
lug_height = lug_gap+2.15;
interlock_offset_x=15.0;
interlock_offset_z=27.0;
interlock_gap=32;

// Door hinge
hinge_inner_diameter=10;
hinge_height=25;
hinge_length=53;
hinge_gap = 9.6;
hinge_clearance = 1.5;
hinge_ring_thickness=3.0;
hinge_thickness=plastic_thickness*2 + door_panel_thickness;
hinge_offset=6.5+plastic_thickness;

enclosure_width=2*(frame_corner_width+plastic_thickness+hinge_gap
    +door_hinge_offset) + door_panel_width*2 +tolerance_smooth;
// main file
include <parameters.scad>
use <utility.scad>
use <support.scad>
use <construction.scad>

module front_left_bottom_corner() {
    difference() {
        add_hinge_post(top=false)
        add_lugs()
        add_connector() 
        extend_frame_x()
            frame_corner( frame_corner_width, 
                frame_corner_height,frame_thickness, 
                corner_roundness);
        fix_preview() left_wall_panel();
    }
}

%left_wall_panel();
front_left_bottom_corner();
